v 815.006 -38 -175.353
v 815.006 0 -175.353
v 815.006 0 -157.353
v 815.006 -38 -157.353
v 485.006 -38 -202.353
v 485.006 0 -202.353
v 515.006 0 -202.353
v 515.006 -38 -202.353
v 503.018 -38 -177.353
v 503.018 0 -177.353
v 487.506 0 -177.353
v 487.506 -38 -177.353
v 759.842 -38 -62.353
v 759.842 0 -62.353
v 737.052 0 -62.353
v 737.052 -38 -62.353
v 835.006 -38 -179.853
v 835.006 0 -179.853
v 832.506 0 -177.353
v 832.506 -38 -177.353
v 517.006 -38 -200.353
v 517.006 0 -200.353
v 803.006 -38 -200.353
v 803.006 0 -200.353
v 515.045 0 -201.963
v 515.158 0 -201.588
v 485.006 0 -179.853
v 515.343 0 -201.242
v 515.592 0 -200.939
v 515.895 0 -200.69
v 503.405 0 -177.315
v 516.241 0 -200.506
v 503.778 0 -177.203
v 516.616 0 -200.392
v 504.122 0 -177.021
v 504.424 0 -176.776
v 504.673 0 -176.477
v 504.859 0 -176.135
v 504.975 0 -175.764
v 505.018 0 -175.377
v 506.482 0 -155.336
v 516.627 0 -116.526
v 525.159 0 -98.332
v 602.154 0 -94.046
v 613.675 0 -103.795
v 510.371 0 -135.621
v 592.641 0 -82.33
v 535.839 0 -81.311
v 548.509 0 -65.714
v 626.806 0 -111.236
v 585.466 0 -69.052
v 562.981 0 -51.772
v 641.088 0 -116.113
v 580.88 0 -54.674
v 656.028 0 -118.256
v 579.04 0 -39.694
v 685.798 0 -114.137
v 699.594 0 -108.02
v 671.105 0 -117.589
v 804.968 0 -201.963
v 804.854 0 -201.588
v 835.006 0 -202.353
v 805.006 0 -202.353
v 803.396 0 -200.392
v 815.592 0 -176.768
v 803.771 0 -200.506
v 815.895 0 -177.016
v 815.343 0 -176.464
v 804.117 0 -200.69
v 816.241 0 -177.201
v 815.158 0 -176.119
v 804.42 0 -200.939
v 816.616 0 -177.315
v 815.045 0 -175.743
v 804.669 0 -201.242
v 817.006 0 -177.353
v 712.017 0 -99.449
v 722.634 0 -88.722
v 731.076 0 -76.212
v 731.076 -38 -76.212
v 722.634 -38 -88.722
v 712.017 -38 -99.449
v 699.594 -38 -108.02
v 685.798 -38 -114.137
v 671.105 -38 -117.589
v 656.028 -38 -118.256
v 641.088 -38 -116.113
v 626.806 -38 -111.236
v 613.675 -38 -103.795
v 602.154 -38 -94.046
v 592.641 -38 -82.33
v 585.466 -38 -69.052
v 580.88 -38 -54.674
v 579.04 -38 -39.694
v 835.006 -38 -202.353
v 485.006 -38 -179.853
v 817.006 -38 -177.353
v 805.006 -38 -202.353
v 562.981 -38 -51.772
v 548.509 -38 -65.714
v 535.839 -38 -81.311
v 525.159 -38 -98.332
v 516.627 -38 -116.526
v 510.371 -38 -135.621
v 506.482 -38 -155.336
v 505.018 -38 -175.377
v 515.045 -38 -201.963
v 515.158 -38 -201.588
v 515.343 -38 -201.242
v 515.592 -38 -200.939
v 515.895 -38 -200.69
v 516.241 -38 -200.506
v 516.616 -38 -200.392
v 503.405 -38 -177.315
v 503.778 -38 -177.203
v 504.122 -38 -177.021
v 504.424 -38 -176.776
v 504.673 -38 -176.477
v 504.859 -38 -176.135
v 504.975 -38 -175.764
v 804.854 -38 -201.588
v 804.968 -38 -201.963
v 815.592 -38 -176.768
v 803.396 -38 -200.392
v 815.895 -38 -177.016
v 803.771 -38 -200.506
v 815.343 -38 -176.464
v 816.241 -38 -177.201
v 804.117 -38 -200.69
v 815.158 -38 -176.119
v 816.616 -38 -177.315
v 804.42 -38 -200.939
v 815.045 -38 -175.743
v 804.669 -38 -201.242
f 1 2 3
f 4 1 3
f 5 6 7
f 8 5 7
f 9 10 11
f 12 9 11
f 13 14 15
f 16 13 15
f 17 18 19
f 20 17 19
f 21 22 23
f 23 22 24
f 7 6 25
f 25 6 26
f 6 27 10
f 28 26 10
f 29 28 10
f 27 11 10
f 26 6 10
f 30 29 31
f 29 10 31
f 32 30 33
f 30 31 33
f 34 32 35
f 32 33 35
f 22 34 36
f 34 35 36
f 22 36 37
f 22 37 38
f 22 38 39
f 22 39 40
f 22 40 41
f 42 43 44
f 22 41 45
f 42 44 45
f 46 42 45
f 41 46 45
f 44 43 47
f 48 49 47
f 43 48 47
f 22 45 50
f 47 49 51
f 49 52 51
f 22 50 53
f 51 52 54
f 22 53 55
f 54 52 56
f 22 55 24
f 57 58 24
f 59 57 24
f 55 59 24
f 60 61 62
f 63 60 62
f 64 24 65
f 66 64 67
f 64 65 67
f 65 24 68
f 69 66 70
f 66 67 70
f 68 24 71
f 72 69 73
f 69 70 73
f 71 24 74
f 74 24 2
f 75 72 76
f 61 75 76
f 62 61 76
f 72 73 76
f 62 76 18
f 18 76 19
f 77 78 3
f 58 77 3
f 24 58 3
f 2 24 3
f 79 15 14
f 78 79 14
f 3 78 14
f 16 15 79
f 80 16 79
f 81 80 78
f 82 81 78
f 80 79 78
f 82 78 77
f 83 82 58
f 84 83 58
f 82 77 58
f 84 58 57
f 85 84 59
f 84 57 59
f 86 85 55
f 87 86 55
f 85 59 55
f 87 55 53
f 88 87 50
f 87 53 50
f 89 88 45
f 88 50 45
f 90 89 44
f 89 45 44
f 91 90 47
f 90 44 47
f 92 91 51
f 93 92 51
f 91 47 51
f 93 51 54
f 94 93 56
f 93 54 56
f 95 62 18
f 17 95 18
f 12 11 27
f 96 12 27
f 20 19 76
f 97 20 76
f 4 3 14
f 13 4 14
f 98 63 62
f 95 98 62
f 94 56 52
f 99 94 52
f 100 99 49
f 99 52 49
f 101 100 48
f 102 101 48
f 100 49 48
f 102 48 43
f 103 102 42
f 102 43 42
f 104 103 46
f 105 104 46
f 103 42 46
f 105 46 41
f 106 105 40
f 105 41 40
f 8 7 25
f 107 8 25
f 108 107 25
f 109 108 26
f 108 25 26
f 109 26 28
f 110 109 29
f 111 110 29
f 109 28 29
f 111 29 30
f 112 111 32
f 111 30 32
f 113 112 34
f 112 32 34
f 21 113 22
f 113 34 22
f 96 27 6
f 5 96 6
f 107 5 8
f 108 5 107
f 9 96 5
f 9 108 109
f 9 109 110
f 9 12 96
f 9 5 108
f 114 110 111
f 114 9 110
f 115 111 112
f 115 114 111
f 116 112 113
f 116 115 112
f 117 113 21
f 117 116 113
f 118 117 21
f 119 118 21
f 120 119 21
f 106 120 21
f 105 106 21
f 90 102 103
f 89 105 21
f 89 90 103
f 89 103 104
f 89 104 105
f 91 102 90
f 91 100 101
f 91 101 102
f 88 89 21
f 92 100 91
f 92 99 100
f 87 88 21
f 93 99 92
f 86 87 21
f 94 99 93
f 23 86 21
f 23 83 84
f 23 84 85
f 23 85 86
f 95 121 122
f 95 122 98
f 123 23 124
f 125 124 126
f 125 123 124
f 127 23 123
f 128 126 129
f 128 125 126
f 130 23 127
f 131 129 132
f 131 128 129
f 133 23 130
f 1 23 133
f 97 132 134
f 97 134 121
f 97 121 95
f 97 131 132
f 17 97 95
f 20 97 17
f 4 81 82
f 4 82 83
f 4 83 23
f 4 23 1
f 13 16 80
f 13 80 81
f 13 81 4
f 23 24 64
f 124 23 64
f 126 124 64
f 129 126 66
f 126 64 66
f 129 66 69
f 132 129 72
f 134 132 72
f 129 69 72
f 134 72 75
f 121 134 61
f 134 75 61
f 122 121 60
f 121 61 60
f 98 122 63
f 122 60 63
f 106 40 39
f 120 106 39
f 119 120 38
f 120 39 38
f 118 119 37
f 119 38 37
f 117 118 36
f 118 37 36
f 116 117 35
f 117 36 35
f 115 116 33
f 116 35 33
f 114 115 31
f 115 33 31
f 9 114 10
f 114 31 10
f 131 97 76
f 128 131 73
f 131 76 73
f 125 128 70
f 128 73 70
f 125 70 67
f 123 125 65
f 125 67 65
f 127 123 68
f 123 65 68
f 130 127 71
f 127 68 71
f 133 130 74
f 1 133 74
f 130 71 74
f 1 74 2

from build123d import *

# Parameters (mm, degrees)
F1_DEPTH = 38


# Not quite as in the source:
# - ends of sketch curves that miss each other by under 0.0002 mm in the source are joined


with BuildPart() as f1:
    # F0 (on Front) → F1 (new body)
    with BuildSketch(Plane.XZ):
        with BuildLine():
            Line((485.006122, -179.853302), (485.006122, -202.353302))
            Line((485.006122, -202.353302), (515.006122, -202.353302))
            ThreePointArc((515.006122, -202.353302), (515.5919084376, -200.9390884376), (517.006122, -200.353302))
            Line((517.006122, -200.353302), (803.006122, -200.353302))
            ThreePointArc((803.006122, -200.353302), (804.4203355624, -200.9390884376), (805.006122, -202.353302))
            Line((805.006122, -202.353302), (835.006122, -202.353302))
            Line((835.006122, -202.353302), (835.006122, -179.853302))
            Line((835.006122, -179.853302), (832.506122, -177.353302))
            Line((832.506122, -177.353302), (817.006122, -177.353302))
            ThreePointArc((817.006122, -177.353302), (815.5919084376, -176.7675155624), (815.006122, -175.353302))
            Line((815.006122, -175.353302), (815.006122, -157.353302))
            Line((815.006122, -157.353302), (759.841906, -62.353302))
            Line((759.841906, -62.353302), (737.051563, -62.353302))
            ThreePointArc((737.051563, -62.353302), (648.507993777, -117.5330565978), (579.0399418017, -39.6937430057))
            ThreePointArc((579.0399418017, -39.6937430057), (525.1590968788, -98.3321699305), (505.0179550476, -175.3772540006))
            ThreePointArc((505.0179550476, -175.3772540006), (504.4238177463, -176.7759586679), (503.018098, -177.353302))
            Line((503.018098, -177.353302), (487.506122, -177.353302))
            Line((487.506122, -177.353302), (485.006122, -179.853302))
        make_face()
    extrude(amount=F1_DEPTH)


solid = f1.part
